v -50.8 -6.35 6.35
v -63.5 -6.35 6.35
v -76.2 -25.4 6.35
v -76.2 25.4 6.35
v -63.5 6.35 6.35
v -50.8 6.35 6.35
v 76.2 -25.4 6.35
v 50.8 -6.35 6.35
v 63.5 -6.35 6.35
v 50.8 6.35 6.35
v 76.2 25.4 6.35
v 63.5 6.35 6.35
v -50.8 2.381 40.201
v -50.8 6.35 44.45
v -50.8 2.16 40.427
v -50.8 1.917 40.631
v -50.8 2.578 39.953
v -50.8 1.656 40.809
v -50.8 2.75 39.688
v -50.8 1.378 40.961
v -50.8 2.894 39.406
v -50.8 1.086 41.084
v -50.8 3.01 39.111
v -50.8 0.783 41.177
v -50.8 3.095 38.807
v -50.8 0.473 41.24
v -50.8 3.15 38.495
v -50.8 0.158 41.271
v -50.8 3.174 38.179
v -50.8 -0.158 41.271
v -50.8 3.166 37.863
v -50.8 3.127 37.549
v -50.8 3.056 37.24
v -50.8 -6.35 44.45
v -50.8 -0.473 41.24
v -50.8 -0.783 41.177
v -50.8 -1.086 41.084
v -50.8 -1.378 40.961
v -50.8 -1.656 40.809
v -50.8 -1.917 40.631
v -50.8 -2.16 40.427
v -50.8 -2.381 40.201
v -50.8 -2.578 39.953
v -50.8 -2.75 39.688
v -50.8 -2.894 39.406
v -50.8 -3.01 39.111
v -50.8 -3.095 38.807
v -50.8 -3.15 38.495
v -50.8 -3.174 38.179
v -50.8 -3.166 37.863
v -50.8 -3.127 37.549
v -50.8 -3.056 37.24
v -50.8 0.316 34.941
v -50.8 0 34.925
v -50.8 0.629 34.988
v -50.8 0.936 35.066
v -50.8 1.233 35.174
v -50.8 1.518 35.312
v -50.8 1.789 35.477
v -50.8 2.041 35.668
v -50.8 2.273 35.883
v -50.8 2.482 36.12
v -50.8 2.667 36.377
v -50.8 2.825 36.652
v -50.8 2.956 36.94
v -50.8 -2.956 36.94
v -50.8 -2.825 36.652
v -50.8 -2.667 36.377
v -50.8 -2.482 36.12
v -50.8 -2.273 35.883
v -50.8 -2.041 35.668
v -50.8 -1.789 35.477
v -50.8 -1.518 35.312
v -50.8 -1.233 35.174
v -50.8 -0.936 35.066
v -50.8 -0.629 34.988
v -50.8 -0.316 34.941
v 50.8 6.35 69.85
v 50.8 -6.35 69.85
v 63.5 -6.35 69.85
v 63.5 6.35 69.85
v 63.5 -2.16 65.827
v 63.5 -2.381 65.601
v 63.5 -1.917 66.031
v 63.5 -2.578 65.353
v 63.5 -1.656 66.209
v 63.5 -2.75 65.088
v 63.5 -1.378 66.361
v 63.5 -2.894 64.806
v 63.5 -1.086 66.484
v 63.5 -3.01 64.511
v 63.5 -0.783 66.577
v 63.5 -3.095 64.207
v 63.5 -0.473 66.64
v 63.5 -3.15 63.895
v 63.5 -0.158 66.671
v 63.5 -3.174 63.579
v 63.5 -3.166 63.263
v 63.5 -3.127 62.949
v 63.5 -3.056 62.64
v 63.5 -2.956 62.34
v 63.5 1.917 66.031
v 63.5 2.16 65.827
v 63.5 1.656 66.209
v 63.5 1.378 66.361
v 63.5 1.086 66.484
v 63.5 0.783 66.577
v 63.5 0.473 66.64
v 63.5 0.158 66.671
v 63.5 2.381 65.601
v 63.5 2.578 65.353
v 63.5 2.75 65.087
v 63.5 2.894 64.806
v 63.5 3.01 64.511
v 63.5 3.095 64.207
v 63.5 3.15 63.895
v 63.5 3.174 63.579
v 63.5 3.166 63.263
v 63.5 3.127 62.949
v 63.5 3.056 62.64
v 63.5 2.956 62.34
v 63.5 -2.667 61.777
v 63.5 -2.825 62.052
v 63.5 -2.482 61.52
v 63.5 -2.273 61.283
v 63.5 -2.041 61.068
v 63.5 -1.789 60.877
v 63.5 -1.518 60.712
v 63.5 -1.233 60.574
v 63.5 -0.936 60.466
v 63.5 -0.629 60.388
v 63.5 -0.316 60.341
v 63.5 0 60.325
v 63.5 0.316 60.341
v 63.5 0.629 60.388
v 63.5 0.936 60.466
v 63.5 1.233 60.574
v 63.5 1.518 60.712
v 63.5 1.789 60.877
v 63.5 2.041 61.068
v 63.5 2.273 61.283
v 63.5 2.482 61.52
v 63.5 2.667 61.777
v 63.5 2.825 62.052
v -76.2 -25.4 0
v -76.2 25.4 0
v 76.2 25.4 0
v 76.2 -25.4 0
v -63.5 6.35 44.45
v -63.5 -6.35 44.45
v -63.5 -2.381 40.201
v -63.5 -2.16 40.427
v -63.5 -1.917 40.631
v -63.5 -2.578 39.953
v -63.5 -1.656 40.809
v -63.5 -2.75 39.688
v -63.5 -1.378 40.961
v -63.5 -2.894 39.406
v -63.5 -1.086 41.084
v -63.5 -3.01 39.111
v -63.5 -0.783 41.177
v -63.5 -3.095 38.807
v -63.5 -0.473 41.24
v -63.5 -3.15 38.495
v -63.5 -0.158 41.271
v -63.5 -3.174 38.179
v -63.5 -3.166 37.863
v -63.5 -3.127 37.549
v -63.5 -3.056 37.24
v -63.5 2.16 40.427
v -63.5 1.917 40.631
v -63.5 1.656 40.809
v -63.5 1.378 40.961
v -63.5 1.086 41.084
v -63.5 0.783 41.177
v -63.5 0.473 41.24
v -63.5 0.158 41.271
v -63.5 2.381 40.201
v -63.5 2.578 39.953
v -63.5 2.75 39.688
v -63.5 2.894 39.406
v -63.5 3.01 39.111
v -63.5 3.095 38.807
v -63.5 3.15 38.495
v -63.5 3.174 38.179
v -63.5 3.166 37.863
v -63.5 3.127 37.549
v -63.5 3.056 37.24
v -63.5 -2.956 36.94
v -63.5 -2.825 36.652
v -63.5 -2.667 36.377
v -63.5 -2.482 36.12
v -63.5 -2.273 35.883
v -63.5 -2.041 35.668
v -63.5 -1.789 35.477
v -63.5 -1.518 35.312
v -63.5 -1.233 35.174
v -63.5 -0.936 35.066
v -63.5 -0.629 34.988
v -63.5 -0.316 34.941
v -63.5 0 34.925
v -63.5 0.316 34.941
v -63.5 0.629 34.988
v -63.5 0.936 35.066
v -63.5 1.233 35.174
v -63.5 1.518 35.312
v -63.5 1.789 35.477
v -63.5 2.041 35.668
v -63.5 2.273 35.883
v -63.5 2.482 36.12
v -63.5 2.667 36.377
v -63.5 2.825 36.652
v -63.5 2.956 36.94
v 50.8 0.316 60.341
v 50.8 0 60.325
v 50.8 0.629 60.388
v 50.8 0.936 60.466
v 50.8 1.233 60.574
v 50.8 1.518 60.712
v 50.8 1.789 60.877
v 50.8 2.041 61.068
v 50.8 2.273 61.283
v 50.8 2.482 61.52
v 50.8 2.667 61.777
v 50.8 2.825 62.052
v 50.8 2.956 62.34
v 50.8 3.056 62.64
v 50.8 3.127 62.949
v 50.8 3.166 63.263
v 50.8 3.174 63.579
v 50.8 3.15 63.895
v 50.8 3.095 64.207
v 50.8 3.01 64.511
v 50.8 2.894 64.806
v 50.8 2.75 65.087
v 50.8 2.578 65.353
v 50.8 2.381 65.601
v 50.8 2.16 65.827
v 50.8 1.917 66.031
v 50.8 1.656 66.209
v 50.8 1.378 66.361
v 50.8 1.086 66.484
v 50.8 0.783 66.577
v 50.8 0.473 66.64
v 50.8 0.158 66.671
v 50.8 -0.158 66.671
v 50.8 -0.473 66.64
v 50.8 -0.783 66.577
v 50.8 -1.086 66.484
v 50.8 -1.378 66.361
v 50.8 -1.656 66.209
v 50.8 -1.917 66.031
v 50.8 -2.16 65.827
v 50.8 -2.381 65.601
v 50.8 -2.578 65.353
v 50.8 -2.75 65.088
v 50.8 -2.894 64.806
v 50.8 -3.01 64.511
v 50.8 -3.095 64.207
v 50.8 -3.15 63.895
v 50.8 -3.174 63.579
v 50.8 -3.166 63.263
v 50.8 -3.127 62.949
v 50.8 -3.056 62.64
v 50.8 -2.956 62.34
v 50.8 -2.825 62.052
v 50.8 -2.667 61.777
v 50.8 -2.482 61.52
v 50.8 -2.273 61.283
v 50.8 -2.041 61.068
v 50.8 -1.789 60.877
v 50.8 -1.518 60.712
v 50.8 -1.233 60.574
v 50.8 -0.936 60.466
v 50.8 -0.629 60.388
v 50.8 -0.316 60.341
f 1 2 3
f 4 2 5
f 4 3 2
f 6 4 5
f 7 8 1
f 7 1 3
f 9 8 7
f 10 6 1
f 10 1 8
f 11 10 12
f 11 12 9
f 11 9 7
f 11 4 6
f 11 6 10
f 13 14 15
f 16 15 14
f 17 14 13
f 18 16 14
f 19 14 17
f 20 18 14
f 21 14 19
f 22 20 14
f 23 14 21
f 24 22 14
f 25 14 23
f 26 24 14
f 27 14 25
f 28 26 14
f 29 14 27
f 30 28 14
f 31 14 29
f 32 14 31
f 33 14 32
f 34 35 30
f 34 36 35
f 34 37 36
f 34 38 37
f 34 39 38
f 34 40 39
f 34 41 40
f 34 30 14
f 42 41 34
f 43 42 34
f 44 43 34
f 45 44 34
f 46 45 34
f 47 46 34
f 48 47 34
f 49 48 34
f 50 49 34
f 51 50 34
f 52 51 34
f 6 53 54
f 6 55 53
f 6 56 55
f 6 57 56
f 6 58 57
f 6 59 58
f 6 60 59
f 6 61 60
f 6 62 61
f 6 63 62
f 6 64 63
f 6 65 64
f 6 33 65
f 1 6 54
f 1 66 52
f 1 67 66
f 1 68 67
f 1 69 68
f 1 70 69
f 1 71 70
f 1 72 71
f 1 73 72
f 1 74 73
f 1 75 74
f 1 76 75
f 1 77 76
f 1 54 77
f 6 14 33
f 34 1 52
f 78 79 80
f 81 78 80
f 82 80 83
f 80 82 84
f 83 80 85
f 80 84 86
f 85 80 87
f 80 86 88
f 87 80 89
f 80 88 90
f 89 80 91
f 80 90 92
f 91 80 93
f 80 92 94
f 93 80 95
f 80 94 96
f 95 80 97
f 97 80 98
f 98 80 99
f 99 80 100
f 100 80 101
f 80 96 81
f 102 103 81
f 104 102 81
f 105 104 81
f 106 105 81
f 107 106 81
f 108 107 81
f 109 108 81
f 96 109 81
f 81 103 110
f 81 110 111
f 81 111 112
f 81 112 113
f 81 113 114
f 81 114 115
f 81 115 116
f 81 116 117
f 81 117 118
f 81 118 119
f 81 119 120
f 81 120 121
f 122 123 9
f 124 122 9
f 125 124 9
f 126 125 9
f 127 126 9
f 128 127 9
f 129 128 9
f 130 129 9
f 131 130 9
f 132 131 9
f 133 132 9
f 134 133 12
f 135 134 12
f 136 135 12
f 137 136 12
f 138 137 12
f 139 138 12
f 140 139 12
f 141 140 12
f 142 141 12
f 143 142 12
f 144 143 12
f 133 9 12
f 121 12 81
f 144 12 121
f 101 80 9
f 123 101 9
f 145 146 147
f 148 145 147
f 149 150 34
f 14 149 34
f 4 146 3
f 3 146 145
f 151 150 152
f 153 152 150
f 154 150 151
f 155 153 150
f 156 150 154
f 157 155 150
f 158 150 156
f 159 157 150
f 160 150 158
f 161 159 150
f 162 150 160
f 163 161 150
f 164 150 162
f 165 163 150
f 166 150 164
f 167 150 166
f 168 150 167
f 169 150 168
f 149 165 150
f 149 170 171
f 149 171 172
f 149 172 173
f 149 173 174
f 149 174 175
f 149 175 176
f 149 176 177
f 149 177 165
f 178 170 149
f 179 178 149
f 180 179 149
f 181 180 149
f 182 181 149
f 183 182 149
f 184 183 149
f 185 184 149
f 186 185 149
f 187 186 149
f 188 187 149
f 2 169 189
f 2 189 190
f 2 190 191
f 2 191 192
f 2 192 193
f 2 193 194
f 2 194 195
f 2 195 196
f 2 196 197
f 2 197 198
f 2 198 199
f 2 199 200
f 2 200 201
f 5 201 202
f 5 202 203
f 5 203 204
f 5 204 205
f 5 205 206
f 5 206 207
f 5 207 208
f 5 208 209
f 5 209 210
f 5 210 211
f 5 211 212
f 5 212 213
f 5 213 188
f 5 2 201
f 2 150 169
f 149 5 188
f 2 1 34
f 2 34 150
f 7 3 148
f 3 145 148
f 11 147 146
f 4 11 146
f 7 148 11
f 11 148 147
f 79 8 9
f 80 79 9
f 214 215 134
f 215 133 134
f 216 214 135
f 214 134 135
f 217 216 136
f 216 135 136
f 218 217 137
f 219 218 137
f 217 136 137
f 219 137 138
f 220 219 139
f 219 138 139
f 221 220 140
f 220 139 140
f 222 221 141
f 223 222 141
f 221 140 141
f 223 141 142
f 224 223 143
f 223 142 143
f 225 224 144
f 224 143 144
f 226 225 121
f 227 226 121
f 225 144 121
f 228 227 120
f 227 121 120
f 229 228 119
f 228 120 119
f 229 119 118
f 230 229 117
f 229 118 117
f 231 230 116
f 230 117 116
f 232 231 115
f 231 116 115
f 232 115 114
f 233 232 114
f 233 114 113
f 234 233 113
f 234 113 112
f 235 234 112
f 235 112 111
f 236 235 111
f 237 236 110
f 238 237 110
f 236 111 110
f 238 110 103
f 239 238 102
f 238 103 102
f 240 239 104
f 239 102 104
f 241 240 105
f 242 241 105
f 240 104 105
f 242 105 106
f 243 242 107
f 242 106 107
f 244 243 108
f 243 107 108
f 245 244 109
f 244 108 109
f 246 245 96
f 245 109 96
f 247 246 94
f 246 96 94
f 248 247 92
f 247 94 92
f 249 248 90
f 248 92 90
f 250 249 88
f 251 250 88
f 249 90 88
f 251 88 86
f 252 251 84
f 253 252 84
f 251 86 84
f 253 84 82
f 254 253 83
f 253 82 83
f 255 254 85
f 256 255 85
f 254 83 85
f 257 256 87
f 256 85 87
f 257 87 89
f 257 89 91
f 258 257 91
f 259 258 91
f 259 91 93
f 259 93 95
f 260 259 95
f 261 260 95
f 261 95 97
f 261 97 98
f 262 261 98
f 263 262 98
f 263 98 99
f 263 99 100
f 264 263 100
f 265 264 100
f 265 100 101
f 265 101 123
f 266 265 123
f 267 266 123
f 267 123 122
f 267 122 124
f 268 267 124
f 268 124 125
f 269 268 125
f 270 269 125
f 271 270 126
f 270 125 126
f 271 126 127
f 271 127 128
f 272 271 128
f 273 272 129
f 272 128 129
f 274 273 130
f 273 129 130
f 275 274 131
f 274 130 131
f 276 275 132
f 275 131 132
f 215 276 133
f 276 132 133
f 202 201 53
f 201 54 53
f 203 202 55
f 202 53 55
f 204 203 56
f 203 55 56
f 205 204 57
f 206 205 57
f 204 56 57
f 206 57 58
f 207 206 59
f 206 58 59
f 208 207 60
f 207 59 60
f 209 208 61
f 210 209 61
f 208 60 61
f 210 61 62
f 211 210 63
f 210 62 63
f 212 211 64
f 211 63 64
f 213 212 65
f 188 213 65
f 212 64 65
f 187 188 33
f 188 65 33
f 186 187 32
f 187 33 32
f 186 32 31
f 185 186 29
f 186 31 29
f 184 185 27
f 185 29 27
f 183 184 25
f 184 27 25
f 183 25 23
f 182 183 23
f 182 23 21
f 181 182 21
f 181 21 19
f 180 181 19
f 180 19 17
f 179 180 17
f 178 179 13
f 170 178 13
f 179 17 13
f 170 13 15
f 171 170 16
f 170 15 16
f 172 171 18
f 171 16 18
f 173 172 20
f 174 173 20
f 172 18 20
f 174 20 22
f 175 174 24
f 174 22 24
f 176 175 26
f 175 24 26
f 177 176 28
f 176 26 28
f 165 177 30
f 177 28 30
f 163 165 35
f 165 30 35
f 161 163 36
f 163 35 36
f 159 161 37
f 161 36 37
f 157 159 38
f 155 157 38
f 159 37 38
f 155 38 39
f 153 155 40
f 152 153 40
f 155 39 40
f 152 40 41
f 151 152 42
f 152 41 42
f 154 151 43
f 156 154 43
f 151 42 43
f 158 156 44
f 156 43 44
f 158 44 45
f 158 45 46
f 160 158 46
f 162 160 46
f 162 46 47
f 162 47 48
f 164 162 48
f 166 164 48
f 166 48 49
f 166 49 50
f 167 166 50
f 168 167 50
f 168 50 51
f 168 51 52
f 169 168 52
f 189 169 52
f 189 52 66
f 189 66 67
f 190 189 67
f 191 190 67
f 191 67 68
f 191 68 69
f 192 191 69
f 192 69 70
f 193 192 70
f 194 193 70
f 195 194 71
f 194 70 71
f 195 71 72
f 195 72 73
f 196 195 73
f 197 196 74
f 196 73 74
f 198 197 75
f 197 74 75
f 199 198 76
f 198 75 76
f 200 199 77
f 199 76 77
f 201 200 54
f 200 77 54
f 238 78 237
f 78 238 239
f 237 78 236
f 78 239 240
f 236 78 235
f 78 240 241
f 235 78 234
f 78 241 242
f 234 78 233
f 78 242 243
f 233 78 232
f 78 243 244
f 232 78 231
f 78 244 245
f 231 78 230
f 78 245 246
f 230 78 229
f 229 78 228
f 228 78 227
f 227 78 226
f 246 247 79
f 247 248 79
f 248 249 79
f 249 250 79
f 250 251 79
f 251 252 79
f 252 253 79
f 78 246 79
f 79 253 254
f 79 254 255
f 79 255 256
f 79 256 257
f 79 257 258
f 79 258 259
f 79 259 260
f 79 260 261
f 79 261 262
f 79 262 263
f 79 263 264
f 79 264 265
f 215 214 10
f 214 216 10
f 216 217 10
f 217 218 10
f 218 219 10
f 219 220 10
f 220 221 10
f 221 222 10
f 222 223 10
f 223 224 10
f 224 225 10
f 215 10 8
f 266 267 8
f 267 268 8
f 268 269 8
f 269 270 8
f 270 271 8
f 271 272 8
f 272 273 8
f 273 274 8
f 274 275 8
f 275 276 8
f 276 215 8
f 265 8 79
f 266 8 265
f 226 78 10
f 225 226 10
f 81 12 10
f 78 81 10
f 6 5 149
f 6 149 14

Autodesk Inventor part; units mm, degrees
ref_plane "YZ Plane" through (0, 0, 0) normal (1, 0, 0) x (0, 1, 0)
ref_plane "XZ Plane" through (0, 0, 0) normal (0, 1, 0) x (-1, 0, 0)
ref_plane "XY Plane" through (0, 0, 0) normal (0, 0, 1) x (1, 0, 0)
sketch "Sketch1" plane through (0, 0, 0) normal (0, 0, 1) x (1, 0, 0)
  line L0 (-76.2, -25.4) -> (76.2, -25.4)
  line L1 (76.2, -25.4) -> (76.2, 25.4)
  line L2 (76.2, 25.4) -> (-76.2, 25.4)
  line L3 (-76.2, 25.4) -> (-76.2, -25.4)
  line L4 (-76.2, -25.4) -> (76.2, 25.4) construction
  line L5 (76.2, -25.4) -> (-76.2, 25.4) construction
  point P0 (0, 0)
  dimension "d0" = 152.4
  dimension "d1" = 50.8
extrude "Extrusion1" add sketch "Sketch1" along normal blind 6.35
sketch "Sketch2" plane through (0, 0, 6.35) normal (0, 0, 1) x (1, 0, 0)
  line L0 (-76.2, 25.4) -> (-76.2, -25.4) projected
  line L1 (-63.5, 6.35) -> (-50.8, 6.35)
  line L2 (-50.8, 6.35) -> (-50.8, -6.35)
  line L3 (-50.8, -6.35) -> (-63.5, -6.35)
  line L4 (-63.5, -6.35) -> (-63.5, 6.35)
  point P0 (0, 0)
  dimension "d4" = 12.7
  dimension "d5" = 12.7
  dimension "d6" = 6.35
  dimension "d7" = 12.7
extrude "Extrusion2" add sketch "Sketch2" along normal blind 38.1
sketch "Sketch3" plane through (0, 0, 6.35) normal (0, 0, 1) x (1, 0, 0)
  line L0 (76.2, -25.4) -> (76.2, 25.4) projected
  line L1 (50.8, -6.35) -> (63.5, -6.35)
  line L2 (63.5, -6.35) -> (63.5, 6.35)
  line L3 (63.5, 6.35) -> (50.8, 6.35)
  line L4 (50.8, 6.35) -> (50.8, -6.35)
  point P0 (0, 0)
  dimension "d10" = 12.7
  dimension "d11" = 12.7
  dimension "d12" = 6.35
  dimension "d13" = 12.7
extrude "Extrusion3" add sketch "Sketch3" along normal blind 63.5
sketch "Sketch4" plane through (63.5, -6.35, 6.35) normal (1, 0, 0) x (0, 0, -1)
  circle A0 centre (-57.15, 6.35) radius 3.175
  line L0 (0, 12.7) -> (-63.5, 12.7) projected
  line L1 (-63.5, 0) -> (-63.5, 12.7) projected
  point P0 (6.35, 6.35)
  dimension "d16" = 6.35
  dimension "d19" = 6.35
  dimension "d20" = 6.35
extrude "Extrusion4" cut sketch "Sketch4" against normal through all
sketch "Sketch5" plane through (-50.8, -6.35, 6.35) normal (1, 0, 0) x (0, 0, -1)
  line L0 (0, 12.7) -> (-38.1, 12.7) projected
  line L1 (-38.1, 0) -> (-38.1, 12.7) projected
  circle A0 centre (-31.75, 6.35) radius 3.175
  point P0 (6.35, 6.35)
  dimension "d21" = 6.35
  dimension "d22" = 6.35
  dimension "d23" = 6.35
extrude "Extrusion5" cut sketch "Sketch5" against normal through all
equation "\"d5\" = d4"
equation "\"d6\" = 0.5 * d4"
equation "\"d12\" = 0.5 * d11"
properties part number "base" material "Silicon Nitride"
